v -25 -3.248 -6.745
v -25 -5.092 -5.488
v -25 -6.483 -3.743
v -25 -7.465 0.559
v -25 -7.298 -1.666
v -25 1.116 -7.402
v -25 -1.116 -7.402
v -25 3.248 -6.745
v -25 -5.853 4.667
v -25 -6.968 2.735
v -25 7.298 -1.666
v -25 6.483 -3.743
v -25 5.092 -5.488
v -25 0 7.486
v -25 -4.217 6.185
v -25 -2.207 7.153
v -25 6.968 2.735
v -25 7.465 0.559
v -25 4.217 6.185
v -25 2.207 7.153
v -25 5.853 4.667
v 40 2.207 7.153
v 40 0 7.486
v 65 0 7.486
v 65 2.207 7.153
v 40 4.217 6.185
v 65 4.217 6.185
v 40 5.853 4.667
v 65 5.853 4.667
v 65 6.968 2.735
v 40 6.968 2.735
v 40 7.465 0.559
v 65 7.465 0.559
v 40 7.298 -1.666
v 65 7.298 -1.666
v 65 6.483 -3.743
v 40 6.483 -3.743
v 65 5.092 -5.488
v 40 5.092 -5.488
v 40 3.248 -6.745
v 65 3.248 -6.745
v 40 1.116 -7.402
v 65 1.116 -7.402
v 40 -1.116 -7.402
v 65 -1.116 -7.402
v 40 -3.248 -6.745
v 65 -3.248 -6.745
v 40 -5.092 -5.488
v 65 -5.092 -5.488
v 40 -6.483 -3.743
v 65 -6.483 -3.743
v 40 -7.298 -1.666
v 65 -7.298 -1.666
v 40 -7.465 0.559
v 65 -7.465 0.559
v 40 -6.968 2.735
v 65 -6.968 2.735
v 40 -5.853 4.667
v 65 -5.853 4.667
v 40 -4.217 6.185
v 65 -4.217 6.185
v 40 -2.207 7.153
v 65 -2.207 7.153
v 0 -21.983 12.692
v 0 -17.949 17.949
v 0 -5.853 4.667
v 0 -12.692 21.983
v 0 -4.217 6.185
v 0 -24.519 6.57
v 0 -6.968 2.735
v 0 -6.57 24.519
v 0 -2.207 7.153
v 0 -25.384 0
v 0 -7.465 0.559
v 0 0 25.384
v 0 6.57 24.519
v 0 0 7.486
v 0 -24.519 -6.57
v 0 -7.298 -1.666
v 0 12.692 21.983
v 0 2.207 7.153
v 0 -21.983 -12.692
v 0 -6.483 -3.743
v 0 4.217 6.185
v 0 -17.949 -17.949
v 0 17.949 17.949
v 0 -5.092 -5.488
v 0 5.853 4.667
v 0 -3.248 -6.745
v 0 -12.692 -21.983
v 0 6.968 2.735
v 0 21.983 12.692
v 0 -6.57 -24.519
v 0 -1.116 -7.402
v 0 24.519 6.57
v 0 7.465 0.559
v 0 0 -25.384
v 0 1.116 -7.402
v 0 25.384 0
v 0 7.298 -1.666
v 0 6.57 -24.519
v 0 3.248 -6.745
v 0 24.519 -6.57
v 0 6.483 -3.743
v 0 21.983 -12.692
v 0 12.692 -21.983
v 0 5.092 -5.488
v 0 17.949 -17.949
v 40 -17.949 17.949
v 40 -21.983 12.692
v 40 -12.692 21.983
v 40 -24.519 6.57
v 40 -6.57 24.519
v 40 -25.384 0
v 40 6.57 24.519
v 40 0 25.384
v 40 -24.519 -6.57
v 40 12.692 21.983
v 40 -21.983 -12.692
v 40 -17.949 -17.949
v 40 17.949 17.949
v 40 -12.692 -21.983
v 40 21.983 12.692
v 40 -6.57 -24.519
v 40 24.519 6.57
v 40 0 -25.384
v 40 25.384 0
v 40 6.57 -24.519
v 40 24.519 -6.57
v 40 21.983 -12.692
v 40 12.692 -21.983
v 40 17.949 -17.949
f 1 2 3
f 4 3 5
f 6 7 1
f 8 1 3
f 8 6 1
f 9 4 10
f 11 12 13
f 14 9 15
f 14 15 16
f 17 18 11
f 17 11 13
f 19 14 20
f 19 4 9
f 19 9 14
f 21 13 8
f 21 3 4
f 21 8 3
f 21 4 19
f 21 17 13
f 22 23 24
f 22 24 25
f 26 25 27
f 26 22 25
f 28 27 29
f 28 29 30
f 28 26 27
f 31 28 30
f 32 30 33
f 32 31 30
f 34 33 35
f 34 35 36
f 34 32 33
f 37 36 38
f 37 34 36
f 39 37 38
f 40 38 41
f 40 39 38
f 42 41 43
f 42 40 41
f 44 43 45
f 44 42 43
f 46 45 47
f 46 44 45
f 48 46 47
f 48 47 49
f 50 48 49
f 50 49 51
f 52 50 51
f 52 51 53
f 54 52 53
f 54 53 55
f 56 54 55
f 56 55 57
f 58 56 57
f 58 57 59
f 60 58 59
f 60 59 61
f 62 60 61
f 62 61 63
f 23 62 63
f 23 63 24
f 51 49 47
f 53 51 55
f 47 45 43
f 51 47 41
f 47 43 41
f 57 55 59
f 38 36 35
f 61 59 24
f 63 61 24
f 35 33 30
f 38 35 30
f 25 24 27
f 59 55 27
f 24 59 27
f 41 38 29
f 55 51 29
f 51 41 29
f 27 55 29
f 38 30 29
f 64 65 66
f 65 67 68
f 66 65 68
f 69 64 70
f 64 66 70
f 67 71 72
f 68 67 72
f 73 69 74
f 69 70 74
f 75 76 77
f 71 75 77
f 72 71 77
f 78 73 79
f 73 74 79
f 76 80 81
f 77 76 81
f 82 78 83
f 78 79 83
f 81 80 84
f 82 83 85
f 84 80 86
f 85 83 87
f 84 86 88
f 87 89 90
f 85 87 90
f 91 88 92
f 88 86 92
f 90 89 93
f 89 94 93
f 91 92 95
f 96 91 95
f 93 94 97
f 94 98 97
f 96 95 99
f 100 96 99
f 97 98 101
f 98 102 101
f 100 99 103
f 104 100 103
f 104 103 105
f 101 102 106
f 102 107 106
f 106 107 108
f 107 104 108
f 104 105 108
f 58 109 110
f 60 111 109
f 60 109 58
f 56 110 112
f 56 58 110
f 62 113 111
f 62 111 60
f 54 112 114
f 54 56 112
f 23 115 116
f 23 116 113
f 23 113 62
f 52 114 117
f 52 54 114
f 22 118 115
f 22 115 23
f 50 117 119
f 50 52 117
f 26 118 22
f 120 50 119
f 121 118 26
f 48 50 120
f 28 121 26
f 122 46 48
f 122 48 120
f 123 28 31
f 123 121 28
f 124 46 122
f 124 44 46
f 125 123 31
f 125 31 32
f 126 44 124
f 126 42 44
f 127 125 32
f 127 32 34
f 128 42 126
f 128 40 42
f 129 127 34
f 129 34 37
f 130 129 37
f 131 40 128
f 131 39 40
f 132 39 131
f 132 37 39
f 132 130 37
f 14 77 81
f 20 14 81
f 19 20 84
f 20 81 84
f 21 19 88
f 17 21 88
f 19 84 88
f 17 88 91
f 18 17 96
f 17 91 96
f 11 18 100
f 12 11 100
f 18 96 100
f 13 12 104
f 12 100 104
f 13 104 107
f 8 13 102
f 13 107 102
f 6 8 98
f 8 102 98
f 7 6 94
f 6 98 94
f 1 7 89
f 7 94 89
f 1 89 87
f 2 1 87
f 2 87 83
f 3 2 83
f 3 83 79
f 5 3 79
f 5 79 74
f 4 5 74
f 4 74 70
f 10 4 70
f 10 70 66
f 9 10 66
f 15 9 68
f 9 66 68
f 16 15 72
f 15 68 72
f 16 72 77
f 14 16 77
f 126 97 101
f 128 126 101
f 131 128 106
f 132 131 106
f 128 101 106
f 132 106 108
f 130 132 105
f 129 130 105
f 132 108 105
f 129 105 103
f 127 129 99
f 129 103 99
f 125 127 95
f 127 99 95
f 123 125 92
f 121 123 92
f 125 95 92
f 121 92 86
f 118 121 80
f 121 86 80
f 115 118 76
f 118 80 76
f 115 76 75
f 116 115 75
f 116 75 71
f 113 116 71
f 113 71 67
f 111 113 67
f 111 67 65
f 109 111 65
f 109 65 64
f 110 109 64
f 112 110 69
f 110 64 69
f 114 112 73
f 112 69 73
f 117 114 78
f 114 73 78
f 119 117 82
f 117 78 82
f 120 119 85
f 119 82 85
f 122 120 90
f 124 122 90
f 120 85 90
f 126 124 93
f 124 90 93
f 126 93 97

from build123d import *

# Parameters (mm, degrees)
SKETCH1_R                = 25.3837
BOSS_EXTRUDE1_DEPTH      = 40
SKETCH2_R                = 7.485924983
BOSS_EXTRUDE2_DEPTH      = 25
BOSS_EXTRUDE2_DEPTH_BACK = 65


with BuildPart() as part:
    # Sketch1 → Boss-Extrude1 (new body)
    with BuildSketch(Plane(origin=(0, 0, 0), x_dir=(0, 0, -1), z_dir=(1, 0, 0))):
        Circle(SKETCH1_R)
    extrude(amount=BOSS_EXTRUDE1_DEPTH)

    # Sketch2 → Boss-Extrude2 (add, two sides)
    with BuildSketch(Plane.ZY) as boss_extrude2_sk:
        Circle(SKETCH2_R)
    extrude(amount=BOSS_EXTRUDE2_DEPTH)
    extrude(boss_extrude2_sk.sketch, amount=-BOSS_EXTRUDE2_DEPTH_BACK)


solid = part.part
